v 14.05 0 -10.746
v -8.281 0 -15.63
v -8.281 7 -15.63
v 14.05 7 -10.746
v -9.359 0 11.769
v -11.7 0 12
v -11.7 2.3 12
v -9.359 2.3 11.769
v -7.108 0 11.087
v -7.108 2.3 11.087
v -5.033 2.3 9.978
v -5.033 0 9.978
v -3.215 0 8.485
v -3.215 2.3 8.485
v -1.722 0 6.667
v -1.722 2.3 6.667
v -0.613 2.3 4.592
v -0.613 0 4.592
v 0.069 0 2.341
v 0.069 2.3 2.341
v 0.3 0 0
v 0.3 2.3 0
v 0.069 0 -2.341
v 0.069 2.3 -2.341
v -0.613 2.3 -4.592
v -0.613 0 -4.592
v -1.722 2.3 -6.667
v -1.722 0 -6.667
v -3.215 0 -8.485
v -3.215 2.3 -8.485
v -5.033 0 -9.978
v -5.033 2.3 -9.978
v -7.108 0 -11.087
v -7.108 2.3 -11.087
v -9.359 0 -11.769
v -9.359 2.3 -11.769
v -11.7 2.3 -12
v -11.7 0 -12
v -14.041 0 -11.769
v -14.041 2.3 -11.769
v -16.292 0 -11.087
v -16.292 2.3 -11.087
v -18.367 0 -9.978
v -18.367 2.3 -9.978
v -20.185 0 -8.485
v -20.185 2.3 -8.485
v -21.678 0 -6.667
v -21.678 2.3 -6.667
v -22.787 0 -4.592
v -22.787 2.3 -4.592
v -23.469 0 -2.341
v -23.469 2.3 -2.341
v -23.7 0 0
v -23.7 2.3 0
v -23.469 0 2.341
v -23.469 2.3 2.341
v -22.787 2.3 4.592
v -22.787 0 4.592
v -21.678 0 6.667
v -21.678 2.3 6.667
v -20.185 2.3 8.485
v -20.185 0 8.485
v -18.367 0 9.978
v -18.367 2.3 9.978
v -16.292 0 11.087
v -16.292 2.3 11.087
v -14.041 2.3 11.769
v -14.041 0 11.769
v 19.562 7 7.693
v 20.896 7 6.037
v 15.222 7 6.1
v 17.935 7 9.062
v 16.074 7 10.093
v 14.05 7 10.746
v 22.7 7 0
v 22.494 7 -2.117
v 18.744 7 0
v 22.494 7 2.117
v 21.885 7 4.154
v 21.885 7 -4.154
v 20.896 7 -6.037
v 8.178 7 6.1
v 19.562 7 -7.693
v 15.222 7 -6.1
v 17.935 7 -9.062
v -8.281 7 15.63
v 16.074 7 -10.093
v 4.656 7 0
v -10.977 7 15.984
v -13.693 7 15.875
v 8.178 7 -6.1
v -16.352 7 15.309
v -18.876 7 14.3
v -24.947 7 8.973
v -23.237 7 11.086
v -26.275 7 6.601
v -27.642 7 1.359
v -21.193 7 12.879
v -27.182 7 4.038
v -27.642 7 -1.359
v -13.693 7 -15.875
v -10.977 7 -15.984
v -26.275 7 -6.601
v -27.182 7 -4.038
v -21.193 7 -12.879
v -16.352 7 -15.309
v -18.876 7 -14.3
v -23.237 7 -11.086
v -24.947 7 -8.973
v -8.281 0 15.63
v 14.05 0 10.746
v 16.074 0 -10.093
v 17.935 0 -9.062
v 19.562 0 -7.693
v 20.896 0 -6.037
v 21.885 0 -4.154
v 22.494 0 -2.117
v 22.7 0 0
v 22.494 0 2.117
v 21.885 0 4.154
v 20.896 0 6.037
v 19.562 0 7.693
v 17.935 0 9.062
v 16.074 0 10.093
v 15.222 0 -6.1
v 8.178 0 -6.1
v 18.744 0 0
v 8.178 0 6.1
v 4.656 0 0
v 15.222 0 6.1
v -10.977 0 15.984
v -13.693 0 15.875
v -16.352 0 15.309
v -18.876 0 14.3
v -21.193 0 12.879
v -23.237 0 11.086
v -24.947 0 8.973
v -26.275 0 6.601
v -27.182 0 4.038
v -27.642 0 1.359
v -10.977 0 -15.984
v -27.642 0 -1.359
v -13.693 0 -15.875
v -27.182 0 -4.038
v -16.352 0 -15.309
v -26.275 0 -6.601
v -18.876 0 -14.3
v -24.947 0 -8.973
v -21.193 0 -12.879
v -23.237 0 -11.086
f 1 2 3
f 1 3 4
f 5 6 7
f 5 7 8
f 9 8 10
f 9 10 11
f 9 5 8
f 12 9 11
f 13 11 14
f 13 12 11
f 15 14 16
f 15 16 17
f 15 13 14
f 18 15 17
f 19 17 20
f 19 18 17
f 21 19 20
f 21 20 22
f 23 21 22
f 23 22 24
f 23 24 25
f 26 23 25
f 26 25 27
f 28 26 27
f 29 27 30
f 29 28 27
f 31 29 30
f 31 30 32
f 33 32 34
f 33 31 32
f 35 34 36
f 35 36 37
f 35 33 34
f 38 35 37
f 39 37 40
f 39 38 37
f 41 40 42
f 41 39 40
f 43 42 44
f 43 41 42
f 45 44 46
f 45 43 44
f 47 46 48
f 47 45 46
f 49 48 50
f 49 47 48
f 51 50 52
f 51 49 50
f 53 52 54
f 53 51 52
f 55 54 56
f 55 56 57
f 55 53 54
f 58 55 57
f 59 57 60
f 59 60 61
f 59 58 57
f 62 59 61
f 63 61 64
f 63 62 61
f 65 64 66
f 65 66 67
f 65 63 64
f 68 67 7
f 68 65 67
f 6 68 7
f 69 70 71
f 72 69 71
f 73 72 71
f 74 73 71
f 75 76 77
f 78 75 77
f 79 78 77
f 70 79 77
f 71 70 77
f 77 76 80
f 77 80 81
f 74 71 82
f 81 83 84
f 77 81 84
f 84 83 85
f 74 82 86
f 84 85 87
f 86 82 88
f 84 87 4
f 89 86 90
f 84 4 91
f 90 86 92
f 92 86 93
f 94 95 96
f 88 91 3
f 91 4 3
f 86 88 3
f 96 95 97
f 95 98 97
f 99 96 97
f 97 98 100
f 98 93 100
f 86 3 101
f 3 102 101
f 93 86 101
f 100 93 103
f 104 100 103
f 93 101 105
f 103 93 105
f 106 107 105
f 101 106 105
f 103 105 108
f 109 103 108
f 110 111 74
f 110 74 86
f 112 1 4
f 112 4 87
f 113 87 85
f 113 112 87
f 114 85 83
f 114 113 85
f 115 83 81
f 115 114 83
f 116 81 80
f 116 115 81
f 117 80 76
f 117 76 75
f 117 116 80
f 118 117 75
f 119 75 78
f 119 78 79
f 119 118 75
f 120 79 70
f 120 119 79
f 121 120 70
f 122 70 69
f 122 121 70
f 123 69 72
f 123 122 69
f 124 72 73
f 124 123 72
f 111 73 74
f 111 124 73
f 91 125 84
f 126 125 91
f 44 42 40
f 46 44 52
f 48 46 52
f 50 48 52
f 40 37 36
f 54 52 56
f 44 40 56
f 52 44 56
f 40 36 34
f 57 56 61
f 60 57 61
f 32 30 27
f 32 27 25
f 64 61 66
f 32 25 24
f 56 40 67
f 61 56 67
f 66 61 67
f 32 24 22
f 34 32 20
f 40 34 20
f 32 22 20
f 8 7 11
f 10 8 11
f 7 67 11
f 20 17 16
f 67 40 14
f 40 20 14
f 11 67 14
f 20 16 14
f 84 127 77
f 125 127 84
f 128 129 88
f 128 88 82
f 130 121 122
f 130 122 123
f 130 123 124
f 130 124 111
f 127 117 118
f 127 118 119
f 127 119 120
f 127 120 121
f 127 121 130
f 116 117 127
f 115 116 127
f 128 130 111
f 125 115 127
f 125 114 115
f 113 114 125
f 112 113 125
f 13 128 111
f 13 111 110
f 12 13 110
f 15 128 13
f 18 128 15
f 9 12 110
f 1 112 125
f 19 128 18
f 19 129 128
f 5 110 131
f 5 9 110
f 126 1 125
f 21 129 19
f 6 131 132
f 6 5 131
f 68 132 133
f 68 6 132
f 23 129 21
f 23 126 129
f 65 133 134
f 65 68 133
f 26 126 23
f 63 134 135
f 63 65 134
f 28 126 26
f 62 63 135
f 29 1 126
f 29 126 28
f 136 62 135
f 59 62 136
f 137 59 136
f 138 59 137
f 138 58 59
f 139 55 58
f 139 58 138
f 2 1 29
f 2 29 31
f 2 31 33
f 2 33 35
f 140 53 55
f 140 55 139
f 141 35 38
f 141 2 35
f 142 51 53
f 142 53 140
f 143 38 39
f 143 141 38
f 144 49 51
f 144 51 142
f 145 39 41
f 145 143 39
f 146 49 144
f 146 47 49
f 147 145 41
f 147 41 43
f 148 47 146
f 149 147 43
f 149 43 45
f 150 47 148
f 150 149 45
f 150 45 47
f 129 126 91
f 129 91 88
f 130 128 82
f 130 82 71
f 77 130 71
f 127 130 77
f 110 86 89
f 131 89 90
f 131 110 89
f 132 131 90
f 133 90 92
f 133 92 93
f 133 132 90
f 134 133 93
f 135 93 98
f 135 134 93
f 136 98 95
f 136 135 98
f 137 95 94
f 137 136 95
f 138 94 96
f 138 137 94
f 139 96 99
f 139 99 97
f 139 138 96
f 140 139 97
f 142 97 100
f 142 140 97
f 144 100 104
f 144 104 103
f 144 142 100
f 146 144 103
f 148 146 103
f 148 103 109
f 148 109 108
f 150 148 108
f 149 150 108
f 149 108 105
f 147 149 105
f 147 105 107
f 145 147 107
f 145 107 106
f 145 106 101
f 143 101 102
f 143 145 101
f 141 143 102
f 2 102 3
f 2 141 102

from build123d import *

# Parameters (mm, degrees)
SKETCH1_R           = 12
BOSS_EXTRUDE1_DEPTH = 7
SKETCH1_4_R         = 12
CUT_EXTRUDE1_DEPTH  = 2.3


with BuildPart() as part:
    # Sketch1 → Boss-Extrude1 (new body)
    with BuildSketch(Plane(origin=(0, 0, 0), x_dir=(1, 0, 0), z_dir=(0, 1, 0))):
        with BuildLine():
            ThreePointArc((14.05042735, 10.74595232), (22.7, 0), (14.05042735, -10.74595232))
            Line((14.05042735, -10.74595232), (-8.281196581, -15.630476102))
            ThreePointArc((-8.281196581, -15.630476102), (-27.7, 0), (-8.281196581, 15.630476102))
            Line((-8.281196581, 15.630476102), (14.05042735, 10.74595232))
        make_face()
        with Locations((-11.7, 0)):
            Circle(SKETCH1_R, mode=Mode.SUBTRACT)
        Polygon((15.221836642, -6.1), (18.743673284, 0), (15.221836642, 6.1), (8.178163358, 6.1), (4.656326716, 0), (8.178163358, -6.1), align=None, mode=Mode.SUBTRACT)
        with Locations((-11.7, 0)):
            Circle(SKETCH1_R)
    extrude(amount=BOSS_EXTRUDE1_DEPTH)

    # Sketch1_4 → Cut-Extrude1 (cut)
    with BuildSketch(Plane(origin=(0, 0, 0), x_dir=(1, 0, 0), z_dir=(0, 1, 0))):
        with Locations(Location((-11.7, 0, 0), (0, 0, 270))):  # turned: the seam where the file's is
            Circle(SKETCH1_4_R)
    extrude(amount=CUT_EXTRUDE1_DEPTH, mode=Mode.SUBTRACT)


solid = part.part
